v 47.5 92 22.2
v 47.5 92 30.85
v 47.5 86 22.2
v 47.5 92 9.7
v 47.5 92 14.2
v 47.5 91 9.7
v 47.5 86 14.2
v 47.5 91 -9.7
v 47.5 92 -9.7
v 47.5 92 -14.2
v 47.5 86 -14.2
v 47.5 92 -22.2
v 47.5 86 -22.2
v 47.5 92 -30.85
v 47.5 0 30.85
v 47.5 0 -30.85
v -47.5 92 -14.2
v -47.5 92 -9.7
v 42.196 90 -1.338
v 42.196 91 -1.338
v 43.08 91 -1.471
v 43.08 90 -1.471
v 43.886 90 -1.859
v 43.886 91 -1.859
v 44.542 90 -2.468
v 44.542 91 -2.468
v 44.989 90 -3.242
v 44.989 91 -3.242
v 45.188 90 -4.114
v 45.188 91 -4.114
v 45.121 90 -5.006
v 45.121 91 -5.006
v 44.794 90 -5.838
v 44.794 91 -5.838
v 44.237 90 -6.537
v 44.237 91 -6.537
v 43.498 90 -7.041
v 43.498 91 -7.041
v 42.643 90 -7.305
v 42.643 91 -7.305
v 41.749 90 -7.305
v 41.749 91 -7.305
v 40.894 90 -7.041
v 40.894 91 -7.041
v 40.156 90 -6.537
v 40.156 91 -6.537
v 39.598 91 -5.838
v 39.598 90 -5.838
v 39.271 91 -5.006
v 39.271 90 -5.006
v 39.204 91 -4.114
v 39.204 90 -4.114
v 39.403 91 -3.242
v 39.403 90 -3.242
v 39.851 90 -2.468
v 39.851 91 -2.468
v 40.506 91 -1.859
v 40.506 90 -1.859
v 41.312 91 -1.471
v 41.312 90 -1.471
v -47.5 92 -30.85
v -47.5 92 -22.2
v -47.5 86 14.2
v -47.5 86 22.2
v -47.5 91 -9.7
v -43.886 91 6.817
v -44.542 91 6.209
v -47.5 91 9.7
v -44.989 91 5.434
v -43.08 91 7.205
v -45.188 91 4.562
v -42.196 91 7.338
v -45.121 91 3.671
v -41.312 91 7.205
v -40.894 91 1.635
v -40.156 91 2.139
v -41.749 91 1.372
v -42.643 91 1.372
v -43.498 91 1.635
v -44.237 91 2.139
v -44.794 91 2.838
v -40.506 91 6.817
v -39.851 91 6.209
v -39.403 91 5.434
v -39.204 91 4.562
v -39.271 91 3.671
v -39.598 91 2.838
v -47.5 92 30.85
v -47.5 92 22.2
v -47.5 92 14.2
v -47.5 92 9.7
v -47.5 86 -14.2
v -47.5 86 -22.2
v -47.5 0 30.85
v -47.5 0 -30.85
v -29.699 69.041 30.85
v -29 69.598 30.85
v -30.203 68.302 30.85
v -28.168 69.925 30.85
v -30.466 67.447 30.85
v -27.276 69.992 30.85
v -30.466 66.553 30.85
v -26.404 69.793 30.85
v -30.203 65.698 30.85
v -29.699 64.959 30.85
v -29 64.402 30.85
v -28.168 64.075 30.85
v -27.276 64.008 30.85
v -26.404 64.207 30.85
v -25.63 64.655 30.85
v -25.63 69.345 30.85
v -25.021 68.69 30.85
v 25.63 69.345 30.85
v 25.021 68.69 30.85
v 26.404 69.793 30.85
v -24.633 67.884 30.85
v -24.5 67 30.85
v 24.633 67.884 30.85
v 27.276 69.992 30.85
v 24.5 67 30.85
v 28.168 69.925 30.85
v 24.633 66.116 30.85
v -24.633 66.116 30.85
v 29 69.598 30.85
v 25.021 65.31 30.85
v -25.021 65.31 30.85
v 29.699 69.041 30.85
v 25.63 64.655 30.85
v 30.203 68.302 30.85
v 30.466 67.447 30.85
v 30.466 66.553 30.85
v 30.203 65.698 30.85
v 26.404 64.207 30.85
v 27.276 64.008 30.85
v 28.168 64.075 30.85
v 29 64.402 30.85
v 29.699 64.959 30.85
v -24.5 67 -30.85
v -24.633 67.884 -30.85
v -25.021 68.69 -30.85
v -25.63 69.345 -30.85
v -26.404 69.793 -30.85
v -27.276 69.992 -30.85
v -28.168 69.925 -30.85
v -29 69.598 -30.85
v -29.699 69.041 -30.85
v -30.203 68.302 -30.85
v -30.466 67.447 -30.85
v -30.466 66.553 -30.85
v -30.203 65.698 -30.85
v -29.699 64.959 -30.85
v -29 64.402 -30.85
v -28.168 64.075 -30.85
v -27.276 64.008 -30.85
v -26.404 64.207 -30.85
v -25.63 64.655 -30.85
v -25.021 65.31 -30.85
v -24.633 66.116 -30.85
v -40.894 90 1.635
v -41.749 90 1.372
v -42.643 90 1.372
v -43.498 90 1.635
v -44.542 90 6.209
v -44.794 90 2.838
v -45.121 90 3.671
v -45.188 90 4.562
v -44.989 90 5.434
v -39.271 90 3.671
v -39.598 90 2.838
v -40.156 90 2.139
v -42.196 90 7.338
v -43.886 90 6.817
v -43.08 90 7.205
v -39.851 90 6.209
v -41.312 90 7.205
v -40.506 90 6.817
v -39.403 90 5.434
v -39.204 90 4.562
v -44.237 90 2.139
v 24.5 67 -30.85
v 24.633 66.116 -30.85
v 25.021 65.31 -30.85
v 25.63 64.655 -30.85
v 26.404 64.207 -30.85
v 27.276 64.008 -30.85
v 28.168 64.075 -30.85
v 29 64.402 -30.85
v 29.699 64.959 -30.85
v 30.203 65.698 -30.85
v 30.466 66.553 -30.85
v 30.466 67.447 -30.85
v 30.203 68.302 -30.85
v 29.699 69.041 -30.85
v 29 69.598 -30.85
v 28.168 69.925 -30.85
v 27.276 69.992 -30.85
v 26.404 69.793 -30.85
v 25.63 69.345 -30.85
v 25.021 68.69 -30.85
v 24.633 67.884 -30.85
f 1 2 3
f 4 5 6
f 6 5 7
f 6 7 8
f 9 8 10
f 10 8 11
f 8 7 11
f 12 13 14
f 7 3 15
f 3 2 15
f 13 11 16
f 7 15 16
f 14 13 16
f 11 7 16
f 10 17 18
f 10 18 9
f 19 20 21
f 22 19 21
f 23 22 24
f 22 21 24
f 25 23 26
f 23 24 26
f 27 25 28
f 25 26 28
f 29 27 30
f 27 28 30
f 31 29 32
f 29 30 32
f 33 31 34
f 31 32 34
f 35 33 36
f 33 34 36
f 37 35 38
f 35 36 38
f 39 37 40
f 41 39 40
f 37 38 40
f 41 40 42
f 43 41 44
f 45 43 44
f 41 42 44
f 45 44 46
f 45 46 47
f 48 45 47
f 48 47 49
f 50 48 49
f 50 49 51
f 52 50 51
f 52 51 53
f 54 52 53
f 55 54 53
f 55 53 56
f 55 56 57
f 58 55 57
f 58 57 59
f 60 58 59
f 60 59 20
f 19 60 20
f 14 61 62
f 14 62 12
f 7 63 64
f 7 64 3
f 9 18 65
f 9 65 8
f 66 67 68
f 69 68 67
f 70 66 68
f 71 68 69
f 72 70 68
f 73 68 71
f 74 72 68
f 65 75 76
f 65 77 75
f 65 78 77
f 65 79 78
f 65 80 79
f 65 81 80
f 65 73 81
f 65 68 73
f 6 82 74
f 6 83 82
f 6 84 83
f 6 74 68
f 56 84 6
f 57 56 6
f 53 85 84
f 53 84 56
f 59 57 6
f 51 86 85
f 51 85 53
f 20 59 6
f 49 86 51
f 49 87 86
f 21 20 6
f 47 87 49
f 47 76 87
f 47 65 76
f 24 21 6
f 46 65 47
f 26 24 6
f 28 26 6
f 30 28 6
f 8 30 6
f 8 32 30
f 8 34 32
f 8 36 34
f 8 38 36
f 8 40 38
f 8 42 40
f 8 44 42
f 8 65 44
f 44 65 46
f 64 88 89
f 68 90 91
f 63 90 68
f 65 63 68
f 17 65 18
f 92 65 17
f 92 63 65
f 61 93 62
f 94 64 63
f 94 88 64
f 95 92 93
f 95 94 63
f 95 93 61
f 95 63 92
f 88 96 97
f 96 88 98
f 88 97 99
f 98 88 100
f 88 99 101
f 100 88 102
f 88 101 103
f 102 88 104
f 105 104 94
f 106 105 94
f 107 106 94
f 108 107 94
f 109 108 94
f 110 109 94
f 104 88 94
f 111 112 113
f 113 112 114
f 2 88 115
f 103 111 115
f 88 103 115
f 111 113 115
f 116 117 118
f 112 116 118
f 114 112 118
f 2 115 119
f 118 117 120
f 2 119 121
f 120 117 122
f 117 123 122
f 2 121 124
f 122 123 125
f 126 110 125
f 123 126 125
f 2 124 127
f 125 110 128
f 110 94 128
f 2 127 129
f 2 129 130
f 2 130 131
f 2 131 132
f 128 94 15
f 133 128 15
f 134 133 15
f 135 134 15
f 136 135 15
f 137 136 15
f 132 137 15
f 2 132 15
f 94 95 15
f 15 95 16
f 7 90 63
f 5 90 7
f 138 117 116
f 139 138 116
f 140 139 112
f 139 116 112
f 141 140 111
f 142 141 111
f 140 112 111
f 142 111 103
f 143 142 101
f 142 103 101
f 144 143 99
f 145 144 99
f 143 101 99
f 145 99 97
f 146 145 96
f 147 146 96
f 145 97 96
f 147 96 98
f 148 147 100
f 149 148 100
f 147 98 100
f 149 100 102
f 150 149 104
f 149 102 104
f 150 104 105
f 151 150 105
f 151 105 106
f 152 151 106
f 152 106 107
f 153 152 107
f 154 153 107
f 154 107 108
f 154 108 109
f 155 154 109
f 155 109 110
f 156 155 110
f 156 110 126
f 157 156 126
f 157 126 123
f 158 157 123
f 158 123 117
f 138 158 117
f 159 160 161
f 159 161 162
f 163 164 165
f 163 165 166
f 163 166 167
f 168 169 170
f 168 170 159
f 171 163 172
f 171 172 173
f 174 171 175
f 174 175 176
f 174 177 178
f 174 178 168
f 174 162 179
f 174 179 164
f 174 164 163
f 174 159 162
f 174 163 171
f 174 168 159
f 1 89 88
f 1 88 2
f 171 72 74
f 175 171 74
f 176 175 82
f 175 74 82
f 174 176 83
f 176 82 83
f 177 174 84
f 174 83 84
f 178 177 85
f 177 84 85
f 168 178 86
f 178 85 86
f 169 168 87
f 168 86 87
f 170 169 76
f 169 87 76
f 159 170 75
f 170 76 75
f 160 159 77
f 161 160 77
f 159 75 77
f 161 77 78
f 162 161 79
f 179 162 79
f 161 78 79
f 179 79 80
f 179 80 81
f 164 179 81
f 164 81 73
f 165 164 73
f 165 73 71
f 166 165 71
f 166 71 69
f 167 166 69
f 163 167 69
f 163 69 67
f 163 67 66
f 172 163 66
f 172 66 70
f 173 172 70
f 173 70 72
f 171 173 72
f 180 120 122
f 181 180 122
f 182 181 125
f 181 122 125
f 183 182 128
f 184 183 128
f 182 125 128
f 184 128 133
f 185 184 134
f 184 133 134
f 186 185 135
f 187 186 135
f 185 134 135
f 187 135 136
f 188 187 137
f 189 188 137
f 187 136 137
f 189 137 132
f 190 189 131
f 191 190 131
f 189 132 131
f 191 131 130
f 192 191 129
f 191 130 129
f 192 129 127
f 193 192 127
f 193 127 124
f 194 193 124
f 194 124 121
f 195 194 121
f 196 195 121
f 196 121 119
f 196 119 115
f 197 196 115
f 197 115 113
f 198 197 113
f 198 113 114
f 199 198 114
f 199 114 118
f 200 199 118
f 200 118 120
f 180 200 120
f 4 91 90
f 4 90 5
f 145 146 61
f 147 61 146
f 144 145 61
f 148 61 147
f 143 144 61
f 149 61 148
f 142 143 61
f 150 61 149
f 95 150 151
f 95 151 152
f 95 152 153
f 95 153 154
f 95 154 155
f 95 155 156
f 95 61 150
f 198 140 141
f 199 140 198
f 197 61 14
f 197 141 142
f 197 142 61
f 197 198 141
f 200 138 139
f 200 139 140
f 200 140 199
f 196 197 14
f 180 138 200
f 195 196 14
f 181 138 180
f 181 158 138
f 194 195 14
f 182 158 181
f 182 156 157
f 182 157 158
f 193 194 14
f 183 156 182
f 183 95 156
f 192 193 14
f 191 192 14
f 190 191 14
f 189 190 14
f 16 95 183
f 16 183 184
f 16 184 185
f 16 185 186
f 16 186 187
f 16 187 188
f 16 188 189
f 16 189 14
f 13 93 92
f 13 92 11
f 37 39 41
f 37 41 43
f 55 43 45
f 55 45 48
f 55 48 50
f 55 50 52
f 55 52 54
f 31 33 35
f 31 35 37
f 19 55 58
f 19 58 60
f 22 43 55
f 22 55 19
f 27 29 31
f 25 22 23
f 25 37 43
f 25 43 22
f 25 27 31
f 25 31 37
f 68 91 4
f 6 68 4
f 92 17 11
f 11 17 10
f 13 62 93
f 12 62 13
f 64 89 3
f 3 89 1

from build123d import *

# Parameters (mm, degrees)
SKETCH_1_W           = 95
SKETCH_1_H           = 61.7
EXTRUDE_1_DEPTH      = 93
SKETCH_3_OUTSIDE_W   = 126.312
SKETCH_3_OUTSIDE_H   = 93.012
SKETCH_3_OUTSIDE_W_2 = 95
SKETCH_3_OUTSIDE_H_2 = 19.4
CUT_EXTRUDE_1_DEPTH  = 1
SKETCH_4_R           = 3
CUT_EXTRUDE_2_DEPTH  = 3
SKETCH_5_W           = 95
SKETCH_5_H           = 8
CUT_EXTRUDE_3_DEPTH  = 6
SKETCH_6_W           = 95
SKETCH_6_H           = 19.4
CUT_EXTRUDE_4_DEPTH  = 2
SKETCH_7_R           = 3
CUT_EXTRUDE_5_DEPTH  = 121.528585821


with BuildPart() as part:
    # 草图1 → 凸台-拉伸1 (new body)
    with BuildSketch(Plane(origin=(0, 0, 0), x_dir=(1, 0, 0), z_dir=(0, 1, 0))):
        Rectangle(SKETCH_1_W, SKETCH_1_H)
    extrude(amount=EXTRUDE_1_DEPTH)

    # 草图3 outside → 切除-拉伸1 (cut)
    with BuildSketch(Plane(origin=(0, 93, 0), x_dir=(1, 0, 0), z_dir=(0, 1, 0))):
        Rectangle(SKETCH_3_OUTSIDE_W, SKETCH_3_OUTSIDE_H)
        Rectangle(SKETCH_3_OUTSIDE_W_2, SKETCH_3_OUTSIDE_H_2, mode=Mode.SUBTRACT)
    extrude(amount=-CUT_EXTRUDE_1_DEPTH, mode=Mode.SUBTRACT)

    # 草图4 → 切除-拉伸2 (cut)
    with BuildSketch(Plane(origin=(0, 93, 0), x_dir=(1, 0, 0), z_dir=(0, 1, 0))):
        with Locations(Location((-42.196054271, -4.338164654, 0), (0, 0, 270))):
            Circle(SKETCH_4_R)
        with Locations(Location((42.196054271, 4.338164654, 0), (0, 0, 270))):
            Circle(SKETCH_4_R)
    extrude(amount=-CUT_EXTRUDE_2_DEPTH, mode=Mode.SUBTRACT)

    # 草图5 → 切除-拉伸3 (cut)
    with BuildSketch(Plane(origin=(0, 92, 0), x_dir=(1, 0, 0), z_dir=(0, 1, 0))):
        with Locations((0, -18.2)):
            Rectangle(SKETCH_5_W, SKETCH_5_H)
        with Locations((0, 18.2)):
            Rectangle(SKETCH_5_W, SKETCH_5_H)
    extrude(amount=-CUT_EXTRUDE_3_DEPTH, mode=Mode.SUBTRACT)

    # 草图6 → 切除-拉伸4 (cut)
    with BuildSketch(Plane(origin=(0, 93, 0), x_dir=(1, 0, 0), z_dir=(0, 1, 0))):
        Rectangle(SKETCH_6_W, SKETCH_6_H)
    extrude(amount=-CUT_EXTRUDE_4_DEPTH, mode=Mode.SUBTRACT)

    # 草图7 → 切除-拉伸5 (cut, through all)
    with BuildSketch(Plane.XY.offset(30.85)):
        with Locations((-27.5, 67)):
            Circle(SKETCH_7_R)
        with Locations(Location((27.5, 67, 0), (0, 0, 180))):
            Circle(SKETCH_7_R)
    extrude(amount=-CUT_EXTRUDE_5_DEPTH, mode=Mode.SUBTRACT)


solid = part.part
